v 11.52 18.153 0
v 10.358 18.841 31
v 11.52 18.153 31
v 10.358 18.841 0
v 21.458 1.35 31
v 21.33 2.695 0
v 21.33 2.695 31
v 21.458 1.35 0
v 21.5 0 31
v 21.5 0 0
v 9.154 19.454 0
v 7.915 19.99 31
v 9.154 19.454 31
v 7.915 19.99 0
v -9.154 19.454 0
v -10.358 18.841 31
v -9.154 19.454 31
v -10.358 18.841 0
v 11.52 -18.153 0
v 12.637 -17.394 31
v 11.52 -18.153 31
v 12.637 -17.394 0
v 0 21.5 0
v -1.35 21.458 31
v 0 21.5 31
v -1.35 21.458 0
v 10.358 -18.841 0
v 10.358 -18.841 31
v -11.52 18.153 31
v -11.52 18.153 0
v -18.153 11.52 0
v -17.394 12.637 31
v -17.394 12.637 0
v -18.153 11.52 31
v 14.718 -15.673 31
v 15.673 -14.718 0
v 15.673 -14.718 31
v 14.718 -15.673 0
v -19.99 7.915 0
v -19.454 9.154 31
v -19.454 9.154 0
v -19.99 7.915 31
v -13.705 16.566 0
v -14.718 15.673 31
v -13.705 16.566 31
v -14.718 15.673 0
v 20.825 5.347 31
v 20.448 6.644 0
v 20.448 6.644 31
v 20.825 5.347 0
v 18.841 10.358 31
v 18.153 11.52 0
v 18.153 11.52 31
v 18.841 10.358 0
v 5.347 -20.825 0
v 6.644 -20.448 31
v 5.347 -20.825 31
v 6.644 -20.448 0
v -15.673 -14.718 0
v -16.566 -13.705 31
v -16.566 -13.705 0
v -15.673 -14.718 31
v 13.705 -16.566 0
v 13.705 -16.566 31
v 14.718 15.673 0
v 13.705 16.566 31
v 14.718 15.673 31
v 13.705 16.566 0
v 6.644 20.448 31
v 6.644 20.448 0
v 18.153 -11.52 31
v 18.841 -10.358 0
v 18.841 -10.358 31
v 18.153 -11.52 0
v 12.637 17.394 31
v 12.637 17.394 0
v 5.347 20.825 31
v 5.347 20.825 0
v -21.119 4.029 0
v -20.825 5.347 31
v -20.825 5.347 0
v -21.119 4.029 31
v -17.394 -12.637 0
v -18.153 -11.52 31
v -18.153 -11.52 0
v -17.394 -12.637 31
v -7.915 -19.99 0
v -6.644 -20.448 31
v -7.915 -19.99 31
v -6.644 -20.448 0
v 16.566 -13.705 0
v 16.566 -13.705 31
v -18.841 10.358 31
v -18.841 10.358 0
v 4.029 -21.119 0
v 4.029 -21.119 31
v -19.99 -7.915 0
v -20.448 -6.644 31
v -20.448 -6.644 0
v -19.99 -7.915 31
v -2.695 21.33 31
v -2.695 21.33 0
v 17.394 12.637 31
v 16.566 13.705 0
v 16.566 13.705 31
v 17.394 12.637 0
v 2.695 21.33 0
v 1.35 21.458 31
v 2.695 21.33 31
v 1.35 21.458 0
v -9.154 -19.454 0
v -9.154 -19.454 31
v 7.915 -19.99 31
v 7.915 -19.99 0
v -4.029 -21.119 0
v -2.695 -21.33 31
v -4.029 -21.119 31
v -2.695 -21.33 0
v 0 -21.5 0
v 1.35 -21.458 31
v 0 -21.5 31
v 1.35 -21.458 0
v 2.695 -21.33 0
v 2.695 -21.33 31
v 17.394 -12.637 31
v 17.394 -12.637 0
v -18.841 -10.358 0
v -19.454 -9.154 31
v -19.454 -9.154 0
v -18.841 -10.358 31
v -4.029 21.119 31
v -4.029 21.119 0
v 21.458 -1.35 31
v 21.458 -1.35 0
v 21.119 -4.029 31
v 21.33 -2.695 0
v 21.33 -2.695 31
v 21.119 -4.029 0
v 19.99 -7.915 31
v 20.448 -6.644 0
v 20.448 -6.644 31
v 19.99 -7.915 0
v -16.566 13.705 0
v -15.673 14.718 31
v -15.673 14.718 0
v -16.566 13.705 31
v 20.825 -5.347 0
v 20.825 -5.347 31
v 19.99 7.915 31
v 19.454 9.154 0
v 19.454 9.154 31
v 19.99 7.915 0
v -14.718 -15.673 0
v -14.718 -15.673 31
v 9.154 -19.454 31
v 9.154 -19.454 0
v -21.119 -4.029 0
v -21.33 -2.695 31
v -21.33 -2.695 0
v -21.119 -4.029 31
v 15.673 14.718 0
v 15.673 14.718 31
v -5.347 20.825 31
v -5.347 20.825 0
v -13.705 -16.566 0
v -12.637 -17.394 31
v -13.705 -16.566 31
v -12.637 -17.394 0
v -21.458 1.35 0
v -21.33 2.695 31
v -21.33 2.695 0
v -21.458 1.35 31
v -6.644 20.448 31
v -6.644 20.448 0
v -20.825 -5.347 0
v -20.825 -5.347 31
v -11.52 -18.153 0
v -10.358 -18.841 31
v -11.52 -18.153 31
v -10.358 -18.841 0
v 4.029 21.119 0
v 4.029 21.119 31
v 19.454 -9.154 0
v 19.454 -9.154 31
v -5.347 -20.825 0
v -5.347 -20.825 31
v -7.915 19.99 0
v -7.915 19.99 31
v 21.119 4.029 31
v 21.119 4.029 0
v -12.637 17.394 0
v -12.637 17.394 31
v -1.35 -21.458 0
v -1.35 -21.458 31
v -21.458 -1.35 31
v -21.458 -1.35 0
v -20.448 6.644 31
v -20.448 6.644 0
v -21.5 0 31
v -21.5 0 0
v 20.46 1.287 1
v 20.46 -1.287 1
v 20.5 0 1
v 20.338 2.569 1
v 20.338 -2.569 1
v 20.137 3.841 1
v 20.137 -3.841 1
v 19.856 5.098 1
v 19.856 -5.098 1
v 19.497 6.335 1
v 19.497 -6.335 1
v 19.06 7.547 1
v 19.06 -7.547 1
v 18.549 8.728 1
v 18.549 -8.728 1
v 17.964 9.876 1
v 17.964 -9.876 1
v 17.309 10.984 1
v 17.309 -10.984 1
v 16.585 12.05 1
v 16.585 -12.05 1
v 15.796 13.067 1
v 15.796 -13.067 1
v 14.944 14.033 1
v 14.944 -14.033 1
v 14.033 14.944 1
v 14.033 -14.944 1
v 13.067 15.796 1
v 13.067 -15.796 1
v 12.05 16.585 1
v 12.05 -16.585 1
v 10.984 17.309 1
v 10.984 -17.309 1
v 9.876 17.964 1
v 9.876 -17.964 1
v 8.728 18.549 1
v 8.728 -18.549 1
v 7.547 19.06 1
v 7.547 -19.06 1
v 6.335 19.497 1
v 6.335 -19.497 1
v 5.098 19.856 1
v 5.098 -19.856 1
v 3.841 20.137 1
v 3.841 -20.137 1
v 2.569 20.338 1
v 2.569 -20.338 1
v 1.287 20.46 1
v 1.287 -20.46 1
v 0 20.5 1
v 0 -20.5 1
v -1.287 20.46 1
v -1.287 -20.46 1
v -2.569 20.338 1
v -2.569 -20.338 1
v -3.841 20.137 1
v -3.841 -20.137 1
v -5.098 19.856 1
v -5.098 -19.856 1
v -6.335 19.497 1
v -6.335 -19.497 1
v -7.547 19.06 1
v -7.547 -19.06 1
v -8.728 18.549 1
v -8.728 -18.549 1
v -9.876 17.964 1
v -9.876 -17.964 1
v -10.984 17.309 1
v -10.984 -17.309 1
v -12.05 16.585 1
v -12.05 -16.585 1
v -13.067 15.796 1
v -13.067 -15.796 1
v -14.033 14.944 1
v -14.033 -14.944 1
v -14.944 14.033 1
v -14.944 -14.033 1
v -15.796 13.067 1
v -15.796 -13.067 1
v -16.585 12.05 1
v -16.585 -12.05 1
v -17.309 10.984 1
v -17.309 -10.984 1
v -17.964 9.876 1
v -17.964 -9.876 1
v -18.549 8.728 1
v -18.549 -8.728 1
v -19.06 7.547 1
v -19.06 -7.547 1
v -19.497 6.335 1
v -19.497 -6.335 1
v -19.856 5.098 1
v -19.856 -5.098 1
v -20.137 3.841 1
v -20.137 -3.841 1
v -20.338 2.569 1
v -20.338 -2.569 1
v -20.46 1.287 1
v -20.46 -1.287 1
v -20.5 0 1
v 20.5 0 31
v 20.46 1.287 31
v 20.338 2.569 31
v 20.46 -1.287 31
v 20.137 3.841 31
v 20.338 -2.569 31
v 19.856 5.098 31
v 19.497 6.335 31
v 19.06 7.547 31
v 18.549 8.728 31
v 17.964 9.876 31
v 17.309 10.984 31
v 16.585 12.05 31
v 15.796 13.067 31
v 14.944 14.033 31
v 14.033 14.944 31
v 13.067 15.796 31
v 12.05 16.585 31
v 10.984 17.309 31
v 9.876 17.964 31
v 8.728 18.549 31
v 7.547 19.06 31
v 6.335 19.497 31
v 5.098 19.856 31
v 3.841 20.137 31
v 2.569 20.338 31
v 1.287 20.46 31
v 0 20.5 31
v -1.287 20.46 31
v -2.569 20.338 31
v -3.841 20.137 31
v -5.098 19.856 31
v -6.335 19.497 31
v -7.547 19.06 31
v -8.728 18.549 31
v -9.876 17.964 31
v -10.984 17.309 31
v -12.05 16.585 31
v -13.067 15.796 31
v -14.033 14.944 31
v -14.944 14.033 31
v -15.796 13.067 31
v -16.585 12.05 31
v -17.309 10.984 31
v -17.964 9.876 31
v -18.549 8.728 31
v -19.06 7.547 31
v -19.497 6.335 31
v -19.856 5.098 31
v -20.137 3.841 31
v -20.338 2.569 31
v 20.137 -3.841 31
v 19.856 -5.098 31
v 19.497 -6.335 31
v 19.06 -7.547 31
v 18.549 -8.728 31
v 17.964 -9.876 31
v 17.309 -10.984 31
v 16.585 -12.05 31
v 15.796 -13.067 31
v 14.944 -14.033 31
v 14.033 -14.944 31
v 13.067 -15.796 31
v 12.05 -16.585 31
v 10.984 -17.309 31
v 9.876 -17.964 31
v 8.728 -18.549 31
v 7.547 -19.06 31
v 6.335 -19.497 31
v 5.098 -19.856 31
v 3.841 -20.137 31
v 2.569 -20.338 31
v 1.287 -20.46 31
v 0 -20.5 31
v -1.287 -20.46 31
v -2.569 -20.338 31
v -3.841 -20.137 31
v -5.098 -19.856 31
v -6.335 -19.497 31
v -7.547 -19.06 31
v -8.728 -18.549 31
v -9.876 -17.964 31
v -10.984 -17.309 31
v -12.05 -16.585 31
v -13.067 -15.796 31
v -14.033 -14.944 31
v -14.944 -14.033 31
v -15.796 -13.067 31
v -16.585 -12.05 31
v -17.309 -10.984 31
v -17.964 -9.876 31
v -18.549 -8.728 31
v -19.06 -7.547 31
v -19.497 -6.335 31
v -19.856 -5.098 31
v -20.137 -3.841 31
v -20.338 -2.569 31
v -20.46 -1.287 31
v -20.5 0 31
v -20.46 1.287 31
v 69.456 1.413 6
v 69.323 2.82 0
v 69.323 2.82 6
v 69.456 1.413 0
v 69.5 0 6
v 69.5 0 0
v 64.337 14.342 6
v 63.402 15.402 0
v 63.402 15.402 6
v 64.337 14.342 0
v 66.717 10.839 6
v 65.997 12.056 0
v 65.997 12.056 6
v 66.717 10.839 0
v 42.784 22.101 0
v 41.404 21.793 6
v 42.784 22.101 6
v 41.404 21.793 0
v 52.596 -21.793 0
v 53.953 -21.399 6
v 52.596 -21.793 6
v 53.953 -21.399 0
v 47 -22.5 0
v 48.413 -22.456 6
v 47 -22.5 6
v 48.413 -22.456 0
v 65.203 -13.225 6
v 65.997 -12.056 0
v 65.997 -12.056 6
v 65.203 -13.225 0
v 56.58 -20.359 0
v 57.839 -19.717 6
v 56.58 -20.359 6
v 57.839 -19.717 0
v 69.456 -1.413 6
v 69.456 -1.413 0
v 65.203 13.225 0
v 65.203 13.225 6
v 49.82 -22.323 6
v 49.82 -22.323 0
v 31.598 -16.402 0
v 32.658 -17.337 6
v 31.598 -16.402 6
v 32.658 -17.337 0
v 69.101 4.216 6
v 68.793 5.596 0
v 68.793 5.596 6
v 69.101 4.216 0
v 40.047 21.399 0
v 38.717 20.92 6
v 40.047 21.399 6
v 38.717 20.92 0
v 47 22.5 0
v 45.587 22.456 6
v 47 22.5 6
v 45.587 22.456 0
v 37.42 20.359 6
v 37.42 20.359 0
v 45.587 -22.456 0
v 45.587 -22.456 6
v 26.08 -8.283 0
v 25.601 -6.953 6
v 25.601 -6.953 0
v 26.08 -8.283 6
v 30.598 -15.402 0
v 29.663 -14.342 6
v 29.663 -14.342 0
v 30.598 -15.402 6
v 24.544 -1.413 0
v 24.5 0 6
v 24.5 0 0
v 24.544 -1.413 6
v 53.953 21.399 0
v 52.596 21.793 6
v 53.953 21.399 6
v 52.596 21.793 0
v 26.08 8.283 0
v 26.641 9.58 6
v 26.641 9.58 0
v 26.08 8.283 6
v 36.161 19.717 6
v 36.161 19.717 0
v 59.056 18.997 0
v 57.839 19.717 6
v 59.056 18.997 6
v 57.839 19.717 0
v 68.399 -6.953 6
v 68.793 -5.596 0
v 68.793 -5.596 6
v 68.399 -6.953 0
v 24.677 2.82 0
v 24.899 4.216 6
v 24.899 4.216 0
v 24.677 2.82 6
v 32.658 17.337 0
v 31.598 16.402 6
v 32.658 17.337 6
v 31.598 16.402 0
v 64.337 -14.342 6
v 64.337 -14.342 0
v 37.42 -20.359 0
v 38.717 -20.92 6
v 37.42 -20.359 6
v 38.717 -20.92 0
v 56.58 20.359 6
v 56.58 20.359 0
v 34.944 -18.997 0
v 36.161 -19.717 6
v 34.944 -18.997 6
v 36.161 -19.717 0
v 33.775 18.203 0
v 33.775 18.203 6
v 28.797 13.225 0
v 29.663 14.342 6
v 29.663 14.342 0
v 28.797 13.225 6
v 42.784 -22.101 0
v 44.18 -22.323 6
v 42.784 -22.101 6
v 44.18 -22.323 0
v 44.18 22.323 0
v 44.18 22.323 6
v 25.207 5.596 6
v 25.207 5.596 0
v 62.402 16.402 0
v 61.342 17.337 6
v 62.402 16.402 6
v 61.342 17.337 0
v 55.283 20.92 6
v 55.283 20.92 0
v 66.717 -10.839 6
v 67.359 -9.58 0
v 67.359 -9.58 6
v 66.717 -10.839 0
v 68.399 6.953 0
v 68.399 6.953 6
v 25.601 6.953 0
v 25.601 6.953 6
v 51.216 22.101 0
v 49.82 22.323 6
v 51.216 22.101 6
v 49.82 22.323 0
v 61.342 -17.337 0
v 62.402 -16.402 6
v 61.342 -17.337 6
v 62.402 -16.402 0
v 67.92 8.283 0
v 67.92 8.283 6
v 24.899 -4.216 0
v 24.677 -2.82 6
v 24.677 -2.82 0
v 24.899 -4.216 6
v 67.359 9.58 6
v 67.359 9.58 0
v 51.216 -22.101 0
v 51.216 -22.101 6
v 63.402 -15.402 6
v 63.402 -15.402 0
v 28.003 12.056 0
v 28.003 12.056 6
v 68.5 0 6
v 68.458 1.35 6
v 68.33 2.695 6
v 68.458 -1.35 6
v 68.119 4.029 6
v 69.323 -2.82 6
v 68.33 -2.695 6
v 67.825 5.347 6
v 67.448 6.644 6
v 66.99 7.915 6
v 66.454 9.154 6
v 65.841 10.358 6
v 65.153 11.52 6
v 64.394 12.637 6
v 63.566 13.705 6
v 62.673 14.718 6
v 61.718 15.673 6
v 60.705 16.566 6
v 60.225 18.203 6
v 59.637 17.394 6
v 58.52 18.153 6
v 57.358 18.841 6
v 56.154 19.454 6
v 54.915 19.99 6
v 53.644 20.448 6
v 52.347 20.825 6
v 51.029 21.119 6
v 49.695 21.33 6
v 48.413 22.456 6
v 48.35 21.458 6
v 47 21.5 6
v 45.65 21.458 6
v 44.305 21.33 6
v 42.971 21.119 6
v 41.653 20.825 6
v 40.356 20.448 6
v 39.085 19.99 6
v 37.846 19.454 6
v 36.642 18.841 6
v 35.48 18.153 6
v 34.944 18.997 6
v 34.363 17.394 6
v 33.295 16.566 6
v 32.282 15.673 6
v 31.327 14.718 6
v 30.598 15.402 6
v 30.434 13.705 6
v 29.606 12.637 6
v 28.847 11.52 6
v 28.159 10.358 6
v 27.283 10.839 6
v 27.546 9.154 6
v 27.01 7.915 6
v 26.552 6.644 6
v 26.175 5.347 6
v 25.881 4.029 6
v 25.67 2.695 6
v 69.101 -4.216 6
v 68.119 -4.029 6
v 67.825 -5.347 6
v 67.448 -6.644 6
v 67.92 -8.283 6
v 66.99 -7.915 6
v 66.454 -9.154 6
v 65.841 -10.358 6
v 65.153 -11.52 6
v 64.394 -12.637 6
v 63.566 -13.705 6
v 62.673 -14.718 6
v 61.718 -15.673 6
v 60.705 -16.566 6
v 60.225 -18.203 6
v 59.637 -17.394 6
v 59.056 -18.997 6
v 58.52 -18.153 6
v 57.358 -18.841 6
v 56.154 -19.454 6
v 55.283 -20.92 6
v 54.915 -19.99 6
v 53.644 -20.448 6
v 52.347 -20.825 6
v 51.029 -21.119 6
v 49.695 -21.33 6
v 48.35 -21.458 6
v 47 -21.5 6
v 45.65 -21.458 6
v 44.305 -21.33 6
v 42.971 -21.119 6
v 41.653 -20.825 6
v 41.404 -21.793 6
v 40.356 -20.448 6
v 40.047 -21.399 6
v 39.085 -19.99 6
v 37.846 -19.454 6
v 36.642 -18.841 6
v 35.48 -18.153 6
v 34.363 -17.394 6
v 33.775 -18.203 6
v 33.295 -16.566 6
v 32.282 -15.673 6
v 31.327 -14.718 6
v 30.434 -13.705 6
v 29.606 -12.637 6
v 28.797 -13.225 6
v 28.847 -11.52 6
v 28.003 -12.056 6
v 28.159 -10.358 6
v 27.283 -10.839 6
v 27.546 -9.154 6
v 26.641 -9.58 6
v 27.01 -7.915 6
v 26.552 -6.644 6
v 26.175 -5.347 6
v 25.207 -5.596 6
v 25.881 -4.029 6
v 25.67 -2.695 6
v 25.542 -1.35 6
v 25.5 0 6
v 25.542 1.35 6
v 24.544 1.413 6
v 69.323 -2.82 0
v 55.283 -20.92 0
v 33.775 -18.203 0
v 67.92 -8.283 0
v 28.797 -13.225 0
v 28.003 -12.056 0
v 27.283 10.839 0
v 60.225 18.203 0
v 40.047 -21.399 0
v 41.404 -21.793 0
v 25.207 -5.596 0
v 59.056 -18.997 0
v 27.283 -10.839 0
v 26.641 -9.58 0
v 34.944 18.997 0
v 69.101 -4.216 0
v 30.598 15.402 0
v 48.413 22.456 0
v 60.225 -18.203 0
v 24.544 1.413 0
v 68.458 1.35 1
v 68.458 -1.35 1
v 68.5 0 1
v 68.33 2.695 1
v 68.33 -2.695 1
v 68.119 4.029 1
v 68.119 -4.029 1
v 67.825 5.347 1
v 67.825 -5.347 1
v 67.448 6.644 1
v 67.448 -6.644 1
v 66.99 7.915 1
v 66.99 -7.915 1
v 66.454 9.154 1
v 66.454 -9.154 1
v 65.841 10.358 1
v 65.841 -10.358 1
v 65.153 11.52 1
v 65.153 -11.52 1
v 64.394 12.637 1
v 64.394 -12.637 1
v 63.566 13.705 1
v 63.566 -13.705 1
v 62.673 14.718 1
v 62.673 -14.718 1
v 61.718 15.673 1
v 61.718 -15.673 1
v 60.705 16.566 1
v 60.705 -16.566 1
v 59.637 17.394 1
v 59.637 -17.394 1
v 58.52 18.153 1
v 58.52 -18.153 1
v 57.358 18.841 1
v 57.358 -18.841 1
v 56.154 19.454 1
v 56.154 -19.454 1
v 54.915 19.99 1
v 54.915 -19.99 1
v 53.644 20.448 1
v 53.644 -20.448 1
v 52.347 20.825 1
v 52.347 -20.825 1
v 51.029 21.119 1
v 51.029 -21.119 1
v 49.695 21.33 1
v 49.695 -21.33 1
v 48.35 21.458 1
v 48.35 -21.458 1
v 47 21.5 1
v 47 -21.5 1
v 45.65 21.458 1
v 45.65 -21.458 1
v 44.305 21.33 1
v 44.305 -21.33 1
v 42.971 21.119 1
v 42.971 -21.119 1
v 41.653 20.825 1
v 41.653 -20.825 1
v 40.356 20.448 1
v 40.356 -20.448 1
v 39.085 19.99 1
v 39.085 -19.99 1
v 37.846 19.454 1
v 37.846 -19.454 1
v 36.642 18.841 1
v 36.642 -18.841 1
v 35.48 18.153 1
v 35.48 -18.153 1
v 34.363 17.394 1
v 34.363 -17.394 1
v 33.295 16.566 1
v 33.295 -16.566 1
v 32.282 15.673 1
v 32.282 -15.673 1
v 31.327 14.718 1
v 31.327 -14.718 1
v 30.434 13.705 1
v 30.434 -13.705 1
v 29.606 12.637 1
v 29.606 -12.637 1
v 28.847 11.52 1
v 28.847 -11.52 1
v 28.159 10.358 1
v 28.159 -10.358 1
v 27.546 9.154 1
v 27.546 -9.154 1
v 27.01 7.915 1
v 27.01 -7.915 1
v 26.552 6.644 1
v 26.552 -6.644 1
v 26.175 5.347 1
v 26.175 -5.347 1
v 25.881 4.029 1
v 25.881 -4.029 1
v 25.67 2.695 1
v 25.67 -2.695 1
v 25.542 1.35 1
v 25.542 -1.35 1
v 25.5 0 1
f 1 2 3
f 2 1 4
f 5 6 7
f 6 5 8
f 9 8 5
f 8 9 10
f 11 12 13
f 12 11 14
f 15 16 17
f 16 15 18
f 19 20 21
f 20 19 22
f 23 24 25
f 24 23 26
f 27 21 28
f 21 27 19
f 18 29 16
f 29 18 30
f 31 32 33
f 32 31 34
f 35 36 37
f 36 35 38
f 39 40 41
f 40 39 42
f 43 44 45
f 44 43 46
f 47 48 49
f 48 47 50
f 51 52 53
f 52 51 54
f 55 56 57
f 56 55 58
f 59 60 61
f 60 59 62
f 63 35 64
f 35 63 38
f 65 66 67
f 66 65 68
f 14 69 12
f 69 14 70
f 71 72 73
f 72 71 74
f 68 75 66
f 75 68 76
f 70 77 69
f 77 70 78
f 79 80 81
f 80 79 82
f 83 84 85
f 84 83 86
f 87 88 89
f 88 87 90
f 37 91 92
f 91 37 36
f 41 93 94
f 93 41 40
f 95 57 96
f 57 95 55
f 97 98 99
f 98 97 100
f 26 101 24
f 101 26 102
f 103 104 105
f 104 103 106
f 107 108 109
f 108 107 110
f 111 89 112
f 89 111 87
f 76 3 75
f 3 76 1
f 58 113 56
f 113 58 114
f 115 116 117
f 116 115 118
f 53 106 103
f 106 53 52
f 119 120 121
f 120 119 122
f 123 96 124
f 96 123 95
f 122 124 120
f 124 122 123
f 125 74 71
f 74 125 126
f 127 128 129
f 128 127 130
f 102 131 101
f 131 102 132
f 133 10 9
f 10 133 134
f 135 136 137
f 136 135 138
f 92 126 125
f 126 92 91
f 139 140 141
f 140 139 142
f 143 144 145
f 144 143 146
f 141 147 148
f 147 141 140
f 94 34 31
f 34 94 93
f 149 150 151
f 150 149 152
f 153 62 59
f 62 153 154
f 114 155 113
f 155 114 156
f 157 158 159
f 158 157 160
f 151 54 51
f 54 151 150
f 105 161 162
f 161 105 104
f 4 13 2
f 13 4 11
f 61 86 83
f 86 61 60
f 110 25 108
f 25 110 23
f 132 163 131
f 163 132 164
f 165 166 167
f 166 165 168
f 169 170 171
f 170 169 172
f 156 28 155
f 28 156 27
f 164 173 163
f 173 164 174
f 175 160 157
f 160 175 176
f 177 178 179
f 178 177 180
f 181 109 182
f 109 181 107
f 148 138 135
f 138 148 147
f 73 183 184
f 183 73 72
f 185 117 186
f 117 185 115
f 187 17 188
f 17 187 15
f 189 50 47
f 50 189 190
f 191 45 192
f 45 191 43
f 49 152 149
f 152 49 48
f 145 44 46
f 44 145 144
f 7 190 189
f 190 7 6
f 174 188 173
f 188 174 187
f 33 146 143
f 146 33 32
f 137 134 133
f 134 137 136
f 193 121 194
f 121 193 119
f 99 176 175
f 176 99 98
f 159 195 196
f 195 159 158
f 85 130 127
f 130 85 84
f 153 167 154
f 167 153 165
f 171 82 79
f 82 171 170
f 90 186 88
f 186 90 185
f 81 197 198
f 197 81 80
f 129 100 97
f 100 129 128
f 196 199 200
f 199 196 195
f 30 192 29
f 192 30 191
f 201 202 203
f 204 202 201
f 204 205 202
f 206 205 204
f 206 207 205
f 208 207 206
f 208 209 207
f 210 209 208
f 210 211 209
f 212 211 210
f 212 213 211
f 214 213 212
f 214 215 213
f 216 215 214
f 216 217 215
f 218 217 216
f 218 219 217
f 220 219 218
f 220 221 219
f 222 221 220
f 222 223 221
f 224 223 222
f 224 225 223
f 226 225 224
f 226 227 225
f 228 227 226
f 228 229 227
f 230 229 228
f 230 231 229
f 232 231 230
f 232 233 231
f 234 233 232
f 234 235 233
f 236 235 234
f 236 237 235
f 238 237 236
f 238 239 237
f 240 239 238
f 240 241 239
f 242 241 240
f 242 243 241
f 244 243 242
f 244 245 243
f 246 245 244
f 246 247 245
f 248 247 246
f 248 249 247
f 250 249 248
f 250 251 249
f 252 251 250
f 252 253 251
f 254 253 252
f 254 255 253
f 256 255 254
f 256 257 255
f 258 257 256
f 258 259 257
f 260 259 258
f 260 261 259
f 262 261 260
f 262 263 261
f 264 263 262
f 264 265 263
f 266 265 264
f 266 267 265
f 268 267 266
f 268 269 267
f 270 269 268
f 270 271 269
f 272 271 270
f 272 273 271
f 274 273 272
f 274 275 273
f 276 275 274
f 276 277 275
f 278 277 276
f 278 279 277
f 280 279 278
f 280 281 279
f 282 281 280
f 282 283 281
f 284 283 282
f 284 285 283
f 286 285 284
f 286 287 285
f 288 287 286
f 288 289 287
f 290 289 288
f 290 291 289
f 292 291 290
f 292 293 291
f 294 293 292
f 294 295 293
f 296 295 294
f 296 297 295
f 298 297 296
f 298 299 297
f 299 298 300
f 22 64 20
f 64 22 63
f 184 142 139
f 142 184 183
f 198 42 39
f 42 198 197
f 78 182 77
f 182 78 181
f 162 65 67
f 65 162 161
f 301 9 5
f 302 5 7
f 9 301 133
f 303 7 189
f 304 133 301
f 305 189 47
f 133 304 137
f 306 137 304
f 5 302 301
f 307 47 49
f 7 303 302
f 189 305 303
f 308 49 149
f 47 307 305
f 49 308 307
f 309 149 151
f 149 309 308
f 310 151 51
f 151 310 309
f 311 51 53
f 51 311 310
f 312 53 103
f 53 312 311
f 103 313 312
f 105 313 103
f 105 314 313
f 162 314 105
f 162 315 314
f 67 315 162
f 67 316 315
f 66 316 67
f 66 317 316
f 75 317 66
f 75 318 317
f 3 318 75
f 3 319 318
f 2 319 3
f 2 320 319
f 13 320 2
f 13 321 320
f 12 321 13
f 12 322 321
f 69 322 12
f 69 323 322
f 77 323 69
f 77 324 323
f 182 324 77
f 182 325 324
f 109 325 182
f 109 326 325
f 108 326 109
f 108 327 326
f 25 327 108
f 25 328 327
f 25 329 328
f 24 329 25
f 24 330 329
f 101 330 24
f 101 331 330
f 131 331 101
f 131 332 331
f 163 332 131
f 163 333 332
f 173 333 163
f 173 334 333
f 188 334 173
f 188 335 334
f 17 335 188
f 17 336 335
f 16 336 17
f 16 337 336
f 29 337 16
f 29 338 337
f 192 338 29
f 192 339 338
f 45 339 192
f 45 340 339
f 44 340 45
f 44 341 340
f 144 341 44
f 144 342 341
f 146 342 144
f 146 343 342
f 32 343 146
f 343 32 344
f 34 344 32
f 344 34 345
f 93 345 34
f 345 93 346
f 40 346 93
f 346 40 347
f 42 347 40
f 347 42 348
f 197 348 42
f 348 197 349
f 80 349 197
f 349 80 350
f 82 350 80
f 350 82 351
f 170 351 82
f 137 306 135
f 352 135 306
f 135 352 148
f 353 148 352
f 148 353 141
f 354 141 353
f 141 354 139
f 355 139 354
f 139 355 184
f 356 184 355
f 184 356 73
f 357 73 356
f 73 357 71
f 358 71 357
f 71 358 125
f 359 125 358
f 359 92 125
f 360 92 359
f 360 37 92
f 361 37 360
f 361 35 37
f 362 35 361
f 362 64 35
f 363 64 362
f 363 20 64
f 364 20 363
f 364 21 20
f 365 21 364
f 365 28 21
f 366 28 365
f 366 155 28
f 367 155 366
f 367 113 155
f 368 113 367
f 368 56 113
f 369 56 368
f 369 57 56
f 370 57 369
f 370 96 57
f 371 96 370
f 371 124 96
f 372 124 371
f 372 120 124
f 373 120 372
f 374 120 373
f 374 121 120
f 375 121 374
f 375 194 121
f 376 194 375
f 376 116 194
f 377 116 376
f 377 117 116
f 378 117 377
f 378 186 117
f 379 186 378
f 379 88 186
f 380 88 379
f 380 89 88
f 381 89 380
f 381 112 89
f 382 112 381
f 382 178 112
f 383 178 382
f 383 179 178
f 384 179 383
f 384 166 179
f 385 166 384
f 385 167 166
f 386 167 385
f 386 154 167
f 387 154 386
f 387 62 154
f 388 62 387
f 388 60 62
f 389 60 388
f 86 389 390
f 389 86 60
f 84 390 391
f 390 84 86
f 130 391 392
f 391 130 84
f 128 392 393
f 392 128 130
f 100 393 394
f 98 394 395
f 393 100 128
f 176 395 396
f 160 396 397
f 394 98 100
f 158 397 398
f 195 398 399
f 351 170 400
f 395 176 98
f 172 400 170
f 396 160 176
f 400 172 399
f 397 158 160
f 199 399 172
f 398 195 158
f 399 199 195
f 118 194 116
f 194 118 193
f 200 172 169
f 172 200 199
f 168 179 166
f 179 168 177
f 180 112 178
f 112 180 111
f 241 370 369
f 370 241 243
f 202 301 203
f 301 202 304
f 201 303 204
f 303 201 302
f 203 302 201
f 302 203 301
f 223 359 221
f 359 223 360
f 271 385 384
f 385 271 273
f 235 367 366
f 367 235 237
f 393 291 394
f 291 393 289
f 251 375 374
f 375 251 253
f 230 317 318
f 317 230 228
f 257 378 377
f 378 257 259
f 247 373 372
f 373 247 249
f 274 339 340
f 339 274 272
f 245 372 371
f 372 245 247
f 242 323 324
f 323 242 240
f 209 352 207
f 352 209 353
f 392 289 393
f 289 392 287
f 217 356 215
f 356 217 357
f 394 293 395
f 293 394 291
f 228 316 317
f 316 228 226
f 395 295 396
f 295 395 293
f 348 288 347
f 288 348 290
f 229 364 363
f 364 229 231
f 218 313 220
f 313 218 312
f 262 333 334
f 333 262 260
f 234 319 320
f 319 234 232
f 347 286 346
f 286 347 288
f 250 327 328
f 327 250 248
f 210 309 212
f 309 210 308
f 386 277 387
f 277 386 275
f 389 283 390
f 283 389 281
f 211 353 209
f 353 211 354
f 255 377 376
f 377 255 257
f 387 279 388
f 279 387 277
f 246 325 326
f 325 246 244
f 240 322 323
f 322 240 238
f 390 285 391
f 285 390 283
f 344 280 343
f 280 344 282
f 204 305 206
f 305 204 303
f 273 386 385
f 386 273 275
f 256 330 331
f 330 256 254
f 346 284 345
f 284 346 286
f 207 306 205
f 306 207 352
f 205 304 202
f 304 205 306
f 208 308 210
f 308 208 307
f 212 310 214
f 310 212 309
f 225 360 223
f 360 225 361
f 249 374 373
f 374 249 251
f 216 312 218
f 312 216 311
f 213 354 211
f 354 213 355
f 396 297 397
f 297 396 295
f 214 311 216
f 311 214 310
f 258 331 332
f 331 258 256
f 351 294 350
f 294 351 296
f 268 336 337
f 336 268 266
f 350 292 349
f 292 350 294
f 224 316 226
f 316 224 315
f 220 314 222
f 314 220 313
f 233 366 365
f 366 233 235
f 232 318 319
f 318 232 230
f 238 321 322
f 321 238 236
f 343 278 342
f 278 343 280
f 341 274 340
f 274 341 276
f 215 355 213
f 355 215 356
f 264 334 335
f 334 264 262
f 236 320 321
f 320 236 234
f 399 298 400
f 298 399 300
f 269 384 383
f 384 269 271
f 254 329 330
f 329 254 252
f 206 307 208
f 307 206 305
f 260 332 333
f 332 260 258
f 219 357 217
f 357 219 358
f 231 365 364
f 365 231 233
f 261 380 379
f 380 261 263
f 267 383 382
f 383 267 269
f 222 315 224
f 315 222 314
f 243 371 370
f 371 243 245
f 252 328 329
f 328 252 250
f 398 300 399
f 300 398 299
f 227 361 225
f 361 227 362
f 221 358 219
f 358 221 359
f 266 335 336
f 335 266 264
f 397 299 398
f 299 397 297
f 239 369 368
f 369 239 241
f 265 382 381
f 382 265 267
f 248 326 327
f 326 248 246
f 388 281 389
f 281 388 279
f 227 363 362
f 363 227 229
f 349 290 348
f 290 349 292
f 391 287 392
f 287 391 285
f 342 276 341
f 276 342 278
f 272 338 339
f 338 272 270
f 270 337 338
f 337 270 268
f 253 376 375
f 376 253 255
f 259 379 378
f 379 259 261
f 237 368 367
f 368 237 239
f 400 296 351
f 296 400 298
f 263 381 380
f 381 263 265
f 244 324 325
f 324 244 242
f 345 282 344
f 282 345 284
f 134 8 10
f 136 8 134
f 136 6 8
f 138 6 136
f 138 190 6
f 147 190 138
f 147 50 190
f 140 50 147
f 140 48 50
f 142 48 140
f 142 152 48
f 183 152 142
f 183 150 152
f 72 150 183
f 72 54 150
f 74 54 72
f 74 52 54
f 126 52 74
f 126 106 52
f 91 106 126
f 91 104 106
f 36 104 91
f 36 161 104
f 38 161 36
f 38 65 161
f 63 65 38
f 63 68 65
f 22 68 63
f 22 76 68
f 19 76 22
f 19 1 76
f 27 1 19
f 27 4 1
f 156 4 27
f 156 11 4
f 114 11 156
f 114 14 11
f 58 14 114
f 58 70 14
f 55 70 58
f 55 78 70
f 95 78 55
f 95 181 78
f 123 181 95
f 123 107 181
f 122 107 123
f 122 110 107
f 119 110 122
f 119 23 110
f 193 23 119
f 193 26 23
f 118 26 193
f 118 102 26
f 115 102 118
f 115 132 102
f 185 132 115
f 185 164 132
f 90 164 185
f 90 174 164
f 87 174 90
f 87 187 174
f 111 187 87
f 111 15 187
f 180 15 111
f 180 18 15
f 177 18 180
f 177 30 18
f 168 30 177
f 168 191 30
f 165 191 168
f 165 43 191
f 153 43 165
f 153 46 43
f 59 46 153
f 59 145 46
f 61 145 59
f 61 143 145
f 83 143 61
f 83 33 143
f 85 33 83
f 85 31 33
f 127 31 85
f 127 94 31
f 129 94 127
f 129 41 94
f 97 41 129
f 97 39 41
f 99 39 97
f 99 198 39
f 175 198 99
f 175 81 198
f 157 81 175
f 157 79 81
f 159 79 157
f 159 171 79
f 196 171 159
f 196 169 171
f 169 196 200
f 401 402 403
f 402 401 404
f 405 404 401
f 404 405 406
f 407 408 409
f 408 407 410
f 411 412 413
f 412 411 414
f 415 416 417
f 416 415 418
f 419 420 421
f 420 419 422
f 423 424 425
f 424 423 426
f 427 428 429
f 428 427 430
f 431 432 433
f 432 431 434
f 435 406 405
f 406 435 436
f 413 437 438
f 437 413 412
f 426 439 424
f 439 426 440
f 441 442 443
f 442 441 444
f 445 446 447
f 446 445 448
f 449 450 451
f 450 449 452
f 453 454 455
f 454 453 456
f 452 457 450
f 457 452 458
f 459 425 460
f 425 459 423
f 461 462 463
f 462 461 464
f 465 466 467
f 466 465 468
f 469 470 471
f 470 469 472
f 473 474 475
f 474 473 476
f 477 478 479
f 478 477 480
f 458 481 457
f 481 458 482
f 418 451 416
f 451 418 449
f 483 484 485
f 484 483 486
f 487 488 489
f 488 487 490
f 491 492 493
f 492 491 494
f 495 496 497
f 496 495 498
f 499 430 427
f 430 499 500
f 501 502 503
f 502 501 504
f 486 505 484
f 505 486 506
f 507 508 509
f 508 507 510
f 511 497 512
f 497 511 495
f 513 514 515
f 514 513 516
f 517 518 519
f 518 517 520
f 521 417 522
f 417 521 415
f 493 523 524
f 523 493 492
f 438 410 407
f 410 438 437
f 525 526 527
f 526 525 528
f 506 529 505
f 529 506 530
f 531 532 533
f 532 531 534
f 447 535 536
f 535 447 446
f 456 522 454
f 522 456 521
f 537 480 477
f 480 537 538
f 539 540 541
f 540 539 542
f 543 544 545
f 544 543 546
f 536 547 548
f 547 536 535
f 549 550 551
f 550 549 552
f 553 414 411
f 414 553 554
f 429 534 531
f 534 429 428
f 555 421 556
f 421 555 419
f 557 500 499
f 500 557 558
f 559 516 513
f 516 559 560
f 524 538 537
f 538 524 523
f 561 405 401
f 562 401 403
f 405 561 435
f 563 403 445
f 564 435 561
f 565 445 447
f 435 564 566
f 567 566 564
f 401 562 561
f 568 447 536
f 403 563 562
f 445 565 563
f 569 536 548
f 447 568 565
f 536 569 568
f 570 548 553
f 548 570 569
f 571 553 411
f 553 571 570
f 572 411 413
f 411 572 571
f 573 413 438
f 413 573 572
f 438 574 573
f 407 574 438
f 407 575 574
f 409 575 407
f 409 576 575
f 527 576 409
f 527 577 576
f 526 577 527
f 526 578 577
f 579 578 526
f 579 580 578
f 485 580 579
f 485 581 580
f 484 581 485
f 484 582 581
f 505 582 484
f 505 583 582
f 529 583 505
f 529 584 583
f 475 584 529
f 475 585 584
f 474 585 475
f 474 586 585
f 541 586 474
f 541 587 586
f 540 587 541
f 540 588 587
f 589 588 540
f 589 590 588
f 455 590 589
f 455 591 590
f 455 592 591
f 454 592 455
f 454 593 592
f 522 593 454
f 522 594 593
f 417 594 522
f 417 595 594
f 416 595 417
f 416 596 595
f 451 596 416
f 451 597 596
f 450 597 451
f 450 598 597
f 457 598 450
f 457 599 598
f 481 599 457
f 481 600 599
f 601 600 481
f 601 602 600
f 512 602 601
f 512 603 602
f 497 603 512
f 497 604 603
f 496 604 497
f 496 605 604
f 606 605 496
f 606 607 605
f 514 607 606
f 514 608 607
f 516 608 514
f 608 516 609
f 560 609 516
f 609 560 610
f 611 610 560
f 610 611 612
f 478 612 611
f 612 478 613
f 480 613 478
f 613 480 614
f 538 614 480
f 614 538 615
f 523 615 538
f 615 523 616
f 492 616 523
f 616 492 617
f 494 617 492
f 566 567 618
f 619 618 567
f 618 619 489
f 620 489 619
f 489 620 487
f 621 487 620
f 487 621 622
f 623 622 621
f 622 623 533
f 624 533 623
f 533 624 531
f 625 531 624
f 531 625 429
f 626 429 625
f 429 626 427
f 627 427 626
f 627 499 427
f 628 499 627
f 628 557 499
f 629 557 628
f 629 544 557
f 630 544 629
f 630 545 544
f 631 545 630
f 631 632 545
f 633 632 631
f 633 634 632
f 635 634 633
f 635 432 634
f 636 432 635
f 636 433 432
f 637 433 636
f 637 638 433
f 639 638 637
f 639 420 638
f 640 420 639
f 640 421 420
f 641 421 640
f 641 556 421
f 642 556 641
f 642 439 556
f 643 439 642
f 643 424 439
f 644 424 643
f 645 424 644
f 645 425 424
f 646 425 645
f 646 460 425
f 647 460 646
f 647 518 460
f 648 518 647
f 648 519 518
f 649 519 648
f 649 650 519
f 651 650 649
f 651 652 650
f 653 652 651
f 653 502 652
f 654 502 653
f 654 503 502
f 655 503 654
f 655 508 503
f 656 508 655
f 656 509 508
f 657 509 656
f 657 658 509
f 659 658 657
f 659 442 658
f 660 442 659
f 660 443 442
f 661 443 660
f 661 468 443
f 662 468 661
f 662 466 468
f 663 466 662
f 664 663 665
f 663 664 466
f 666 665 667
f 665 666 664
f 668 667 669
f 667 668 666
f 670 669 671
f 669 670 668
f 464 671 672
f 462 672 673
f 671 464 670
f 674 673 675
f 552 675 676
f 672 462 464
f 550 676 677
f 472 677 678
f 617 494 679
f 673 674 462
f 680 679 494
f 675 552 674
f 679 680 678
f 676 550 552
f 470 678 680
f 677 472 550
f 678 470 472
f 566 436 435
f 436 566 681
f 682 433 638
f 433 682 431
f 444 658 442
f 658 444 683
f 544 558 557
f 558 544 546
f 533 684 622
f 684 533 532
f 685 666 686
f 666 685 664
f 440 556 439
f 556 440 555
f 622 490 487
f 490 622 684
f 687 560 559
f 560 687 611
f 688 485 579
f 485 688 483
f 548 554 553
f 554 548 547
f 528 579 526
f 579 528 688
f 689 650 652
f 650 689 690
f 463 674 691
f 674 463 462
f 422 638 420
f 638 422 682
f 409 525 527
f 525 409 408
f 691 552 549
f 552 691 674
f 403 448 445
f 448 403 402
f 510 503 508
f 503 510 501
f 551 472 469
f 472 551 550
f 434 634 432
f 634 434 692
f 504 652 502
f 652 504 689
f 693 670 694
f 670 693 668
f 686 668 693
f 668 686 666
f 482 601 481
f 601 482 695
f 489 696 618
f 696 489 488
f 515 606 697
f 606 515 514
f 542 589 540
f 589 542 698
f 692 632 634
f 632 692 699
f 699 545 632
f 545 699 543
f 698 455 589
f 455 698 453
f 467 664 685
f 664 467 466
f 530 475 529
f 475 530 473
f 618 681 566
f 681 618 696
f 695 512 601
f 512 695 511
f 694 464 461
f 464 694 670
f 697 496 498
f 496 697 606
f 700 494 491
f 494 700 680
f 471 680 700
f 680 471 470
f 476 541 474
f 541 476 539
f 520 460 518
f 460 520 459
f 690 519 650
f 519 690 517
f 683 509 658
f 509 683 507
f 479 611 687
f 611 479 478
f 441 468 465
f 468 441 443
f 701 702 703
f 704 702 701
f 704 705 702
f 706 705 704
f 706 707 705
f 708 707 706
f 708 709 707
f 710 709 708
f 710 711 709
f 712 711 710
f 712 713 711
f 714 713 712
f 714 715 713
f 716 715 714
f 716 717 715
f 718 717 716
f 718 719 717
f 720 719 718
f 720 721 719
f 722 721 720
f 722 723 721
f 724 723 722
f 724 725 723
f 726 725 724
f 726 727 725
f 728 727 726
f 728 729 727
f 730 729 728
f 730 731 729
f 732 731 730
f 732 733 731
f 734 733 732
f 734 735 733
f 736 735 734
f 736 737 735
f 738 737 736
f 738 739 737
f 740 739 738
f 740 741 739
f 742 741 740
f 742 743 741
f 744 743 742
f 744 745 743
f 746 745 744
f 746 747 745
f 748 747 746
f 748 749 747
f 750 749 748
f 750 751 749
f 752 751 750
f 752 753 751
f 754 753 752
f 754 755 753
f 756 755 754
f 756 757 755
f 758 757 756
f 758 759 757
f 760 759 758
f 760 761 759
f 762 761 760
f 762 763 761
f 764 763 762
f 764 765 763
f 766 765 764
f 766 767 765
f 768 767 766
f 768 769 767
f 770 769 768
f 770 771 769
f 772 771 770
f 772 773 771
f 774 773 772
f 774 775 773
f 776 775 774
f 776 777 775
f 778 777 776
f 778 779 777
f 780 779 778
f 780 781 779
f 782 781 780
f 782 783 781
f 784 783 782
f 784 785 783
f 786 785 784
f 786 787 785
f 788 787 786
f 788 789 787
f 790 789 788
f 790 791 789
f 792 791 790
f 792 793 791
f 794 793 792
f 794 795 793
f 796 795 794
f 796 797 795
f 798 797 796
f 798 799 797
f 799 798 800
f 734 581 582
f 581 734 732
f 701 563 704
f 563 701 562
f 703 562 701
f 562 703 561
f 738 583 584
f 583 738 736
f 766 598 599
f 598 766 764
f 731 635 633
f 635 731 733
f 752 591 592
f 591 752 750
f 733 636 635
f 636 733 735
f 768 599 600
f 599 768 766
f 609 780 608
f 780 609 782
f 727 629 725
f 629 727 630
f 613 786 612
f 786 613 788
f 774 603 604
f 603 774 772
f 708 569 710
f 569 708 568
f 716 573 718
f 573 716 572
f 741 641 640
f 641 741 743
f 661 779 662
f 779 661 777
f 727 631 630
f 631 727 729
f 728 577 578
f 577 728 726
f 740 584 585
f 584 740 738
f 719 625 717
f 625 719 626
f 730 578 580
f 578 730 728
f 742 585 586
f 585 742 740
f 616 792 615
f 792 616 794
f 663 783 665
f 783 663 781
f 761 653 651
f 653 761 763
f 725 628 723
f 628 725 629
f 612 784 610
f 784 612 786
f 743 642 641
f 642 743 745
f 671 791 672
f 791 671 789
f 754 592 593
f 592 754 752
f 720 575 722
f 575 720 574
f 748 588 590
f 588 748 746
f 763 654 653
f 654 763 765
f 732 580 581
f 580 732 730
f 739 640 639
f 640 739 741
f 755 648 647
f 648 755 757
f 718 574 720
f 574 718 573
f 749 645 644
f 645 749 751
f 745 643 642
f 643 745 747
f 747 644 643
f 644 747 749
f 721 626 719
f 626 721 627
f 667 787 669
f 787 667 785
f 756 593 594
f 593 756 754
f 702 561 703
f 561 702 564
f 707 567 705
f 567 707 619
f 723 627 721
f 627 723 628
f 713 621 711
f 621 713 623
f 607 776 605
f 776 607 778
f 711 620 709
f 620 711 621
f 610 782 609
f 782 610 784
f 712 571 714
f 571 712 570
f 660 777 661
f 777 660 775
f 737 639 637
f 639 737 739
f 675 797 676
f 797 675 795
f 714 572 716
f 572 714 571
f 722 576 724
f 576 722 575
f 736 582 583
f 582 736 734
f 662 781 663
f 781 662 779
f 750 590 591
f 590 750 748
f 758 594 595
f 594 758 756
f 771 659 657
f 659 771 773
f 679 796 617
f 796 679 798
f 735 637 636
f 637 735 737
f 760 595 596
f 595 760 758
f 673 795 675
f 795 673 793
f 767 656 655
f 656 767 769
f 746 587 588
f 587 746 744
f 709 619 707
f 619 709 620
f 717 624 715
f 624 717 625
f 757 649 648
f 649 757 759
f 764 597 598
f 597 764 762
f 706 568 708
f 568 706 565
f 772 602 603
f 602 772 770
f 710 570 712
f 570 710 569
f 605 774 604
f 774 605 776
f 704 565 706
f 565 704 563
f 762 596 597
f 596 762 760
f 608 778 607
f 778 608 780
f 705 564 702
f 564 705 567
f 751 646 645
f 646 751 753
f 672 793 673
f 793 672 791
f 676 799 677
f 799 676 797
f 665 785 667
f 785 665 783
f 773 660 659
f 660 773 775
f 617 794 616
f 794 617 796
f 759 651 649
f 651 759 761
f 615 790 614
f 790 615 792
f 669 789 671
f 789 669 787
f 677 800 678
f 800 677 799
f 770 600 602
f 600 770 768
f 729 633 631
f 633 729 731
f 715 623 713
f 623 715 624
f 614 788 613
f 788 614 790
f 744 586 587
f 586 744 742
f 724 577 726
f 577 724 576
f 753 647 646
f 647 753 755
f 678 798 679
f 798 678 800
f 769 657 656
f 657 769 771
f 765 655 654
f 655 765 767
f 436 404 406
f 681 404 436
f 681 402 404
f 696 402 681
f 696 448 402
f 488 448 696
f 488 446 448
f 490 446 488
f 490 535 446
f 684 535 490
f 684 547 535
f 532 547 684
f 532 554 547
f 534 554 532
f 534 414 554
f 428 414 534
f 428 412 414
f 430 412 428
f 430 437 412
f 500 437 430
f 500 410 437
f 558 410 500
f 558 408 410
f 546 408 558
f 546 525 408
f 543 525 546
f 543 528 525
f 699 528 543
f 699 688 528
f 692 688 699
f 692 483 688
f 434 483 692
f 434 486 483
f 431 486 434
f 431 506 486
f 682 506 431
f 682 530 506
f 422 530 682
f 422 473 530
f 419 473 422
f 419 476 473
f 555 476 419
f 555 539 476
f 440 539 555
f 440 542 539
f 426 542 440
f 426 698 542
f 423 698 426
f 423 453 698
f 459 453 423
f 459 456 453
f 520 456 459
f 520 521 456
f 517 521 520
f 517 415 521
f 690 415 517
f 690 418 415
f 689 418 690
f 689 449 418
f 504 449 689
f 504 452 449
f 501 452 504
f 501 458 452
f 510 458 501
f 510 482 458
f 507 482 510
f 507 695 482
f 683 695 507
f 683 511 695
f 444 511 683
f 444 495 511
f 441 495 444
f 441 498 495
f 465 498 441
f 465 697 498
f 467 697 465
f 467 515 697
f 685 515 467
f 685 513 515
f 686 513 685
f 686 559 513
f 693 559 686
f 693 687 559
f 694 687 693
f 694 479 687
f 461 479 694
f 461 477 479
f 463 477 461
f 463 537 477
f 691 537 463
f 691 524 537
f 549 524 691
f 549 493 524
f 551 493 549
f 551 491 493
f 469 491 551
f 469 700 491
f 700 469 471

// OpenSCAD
/*  
**  Name:  Customizable Coin Container_3d_model
**  Author:  Chris Benson  @TheExtruder
**  Created:  2/24/2017
*/
part = "both" ; // [first:Container Only,second:Cap Only,both:Container and Cap]

numberOfCoins = 10;

//in millimeters
coinHeight = 3;
//in millimeters
coinDiameter = 41;
//in millimeters.  The final height will this value + the wall thickness.
capHeight = 5;

wallThickness = 1;

/* [Hidden] */
$fn = 100;

print_part();

module print_part() {
	if (part == "first") {
		//container
        CreateContainer();
	} else if (part == "second") {
		//cap
        CreateCap();
	} else if (part == "both") {
		CreateContainerAndCap();
	} else {
		CreateContainerAndCap();
	}
}

module CreateContainer(){
    CreateCylinder(numberOfCoins * coinHeight, coinDiameter, wallThickness);
}

module CreateCap(){
    CreateCylinder(capHeight, coinDiameter + wallThickness * 2, wallThickness);
}

module CreateContainerAndCap(){
    CreateContainer();
    translate([coinDiameter + wallThickness + 5,0,0])
        CreateCap();
}

module CreateCylinder(height,innerDiameter,wallThinkness){
    union(){
        //bottom
        cylinder(wallThickness, d=innerDiameter + (wallThickness * 2), true);
        
        translate([0,0,wallThickness]){
            difference(){
                //outer wall
                cylinder(height, d=innerDiameter + (wallThickness * 2), true);
                //inner wall
                cylinder(height, d=innerDiameter, true);
            }
        }
    }
}
